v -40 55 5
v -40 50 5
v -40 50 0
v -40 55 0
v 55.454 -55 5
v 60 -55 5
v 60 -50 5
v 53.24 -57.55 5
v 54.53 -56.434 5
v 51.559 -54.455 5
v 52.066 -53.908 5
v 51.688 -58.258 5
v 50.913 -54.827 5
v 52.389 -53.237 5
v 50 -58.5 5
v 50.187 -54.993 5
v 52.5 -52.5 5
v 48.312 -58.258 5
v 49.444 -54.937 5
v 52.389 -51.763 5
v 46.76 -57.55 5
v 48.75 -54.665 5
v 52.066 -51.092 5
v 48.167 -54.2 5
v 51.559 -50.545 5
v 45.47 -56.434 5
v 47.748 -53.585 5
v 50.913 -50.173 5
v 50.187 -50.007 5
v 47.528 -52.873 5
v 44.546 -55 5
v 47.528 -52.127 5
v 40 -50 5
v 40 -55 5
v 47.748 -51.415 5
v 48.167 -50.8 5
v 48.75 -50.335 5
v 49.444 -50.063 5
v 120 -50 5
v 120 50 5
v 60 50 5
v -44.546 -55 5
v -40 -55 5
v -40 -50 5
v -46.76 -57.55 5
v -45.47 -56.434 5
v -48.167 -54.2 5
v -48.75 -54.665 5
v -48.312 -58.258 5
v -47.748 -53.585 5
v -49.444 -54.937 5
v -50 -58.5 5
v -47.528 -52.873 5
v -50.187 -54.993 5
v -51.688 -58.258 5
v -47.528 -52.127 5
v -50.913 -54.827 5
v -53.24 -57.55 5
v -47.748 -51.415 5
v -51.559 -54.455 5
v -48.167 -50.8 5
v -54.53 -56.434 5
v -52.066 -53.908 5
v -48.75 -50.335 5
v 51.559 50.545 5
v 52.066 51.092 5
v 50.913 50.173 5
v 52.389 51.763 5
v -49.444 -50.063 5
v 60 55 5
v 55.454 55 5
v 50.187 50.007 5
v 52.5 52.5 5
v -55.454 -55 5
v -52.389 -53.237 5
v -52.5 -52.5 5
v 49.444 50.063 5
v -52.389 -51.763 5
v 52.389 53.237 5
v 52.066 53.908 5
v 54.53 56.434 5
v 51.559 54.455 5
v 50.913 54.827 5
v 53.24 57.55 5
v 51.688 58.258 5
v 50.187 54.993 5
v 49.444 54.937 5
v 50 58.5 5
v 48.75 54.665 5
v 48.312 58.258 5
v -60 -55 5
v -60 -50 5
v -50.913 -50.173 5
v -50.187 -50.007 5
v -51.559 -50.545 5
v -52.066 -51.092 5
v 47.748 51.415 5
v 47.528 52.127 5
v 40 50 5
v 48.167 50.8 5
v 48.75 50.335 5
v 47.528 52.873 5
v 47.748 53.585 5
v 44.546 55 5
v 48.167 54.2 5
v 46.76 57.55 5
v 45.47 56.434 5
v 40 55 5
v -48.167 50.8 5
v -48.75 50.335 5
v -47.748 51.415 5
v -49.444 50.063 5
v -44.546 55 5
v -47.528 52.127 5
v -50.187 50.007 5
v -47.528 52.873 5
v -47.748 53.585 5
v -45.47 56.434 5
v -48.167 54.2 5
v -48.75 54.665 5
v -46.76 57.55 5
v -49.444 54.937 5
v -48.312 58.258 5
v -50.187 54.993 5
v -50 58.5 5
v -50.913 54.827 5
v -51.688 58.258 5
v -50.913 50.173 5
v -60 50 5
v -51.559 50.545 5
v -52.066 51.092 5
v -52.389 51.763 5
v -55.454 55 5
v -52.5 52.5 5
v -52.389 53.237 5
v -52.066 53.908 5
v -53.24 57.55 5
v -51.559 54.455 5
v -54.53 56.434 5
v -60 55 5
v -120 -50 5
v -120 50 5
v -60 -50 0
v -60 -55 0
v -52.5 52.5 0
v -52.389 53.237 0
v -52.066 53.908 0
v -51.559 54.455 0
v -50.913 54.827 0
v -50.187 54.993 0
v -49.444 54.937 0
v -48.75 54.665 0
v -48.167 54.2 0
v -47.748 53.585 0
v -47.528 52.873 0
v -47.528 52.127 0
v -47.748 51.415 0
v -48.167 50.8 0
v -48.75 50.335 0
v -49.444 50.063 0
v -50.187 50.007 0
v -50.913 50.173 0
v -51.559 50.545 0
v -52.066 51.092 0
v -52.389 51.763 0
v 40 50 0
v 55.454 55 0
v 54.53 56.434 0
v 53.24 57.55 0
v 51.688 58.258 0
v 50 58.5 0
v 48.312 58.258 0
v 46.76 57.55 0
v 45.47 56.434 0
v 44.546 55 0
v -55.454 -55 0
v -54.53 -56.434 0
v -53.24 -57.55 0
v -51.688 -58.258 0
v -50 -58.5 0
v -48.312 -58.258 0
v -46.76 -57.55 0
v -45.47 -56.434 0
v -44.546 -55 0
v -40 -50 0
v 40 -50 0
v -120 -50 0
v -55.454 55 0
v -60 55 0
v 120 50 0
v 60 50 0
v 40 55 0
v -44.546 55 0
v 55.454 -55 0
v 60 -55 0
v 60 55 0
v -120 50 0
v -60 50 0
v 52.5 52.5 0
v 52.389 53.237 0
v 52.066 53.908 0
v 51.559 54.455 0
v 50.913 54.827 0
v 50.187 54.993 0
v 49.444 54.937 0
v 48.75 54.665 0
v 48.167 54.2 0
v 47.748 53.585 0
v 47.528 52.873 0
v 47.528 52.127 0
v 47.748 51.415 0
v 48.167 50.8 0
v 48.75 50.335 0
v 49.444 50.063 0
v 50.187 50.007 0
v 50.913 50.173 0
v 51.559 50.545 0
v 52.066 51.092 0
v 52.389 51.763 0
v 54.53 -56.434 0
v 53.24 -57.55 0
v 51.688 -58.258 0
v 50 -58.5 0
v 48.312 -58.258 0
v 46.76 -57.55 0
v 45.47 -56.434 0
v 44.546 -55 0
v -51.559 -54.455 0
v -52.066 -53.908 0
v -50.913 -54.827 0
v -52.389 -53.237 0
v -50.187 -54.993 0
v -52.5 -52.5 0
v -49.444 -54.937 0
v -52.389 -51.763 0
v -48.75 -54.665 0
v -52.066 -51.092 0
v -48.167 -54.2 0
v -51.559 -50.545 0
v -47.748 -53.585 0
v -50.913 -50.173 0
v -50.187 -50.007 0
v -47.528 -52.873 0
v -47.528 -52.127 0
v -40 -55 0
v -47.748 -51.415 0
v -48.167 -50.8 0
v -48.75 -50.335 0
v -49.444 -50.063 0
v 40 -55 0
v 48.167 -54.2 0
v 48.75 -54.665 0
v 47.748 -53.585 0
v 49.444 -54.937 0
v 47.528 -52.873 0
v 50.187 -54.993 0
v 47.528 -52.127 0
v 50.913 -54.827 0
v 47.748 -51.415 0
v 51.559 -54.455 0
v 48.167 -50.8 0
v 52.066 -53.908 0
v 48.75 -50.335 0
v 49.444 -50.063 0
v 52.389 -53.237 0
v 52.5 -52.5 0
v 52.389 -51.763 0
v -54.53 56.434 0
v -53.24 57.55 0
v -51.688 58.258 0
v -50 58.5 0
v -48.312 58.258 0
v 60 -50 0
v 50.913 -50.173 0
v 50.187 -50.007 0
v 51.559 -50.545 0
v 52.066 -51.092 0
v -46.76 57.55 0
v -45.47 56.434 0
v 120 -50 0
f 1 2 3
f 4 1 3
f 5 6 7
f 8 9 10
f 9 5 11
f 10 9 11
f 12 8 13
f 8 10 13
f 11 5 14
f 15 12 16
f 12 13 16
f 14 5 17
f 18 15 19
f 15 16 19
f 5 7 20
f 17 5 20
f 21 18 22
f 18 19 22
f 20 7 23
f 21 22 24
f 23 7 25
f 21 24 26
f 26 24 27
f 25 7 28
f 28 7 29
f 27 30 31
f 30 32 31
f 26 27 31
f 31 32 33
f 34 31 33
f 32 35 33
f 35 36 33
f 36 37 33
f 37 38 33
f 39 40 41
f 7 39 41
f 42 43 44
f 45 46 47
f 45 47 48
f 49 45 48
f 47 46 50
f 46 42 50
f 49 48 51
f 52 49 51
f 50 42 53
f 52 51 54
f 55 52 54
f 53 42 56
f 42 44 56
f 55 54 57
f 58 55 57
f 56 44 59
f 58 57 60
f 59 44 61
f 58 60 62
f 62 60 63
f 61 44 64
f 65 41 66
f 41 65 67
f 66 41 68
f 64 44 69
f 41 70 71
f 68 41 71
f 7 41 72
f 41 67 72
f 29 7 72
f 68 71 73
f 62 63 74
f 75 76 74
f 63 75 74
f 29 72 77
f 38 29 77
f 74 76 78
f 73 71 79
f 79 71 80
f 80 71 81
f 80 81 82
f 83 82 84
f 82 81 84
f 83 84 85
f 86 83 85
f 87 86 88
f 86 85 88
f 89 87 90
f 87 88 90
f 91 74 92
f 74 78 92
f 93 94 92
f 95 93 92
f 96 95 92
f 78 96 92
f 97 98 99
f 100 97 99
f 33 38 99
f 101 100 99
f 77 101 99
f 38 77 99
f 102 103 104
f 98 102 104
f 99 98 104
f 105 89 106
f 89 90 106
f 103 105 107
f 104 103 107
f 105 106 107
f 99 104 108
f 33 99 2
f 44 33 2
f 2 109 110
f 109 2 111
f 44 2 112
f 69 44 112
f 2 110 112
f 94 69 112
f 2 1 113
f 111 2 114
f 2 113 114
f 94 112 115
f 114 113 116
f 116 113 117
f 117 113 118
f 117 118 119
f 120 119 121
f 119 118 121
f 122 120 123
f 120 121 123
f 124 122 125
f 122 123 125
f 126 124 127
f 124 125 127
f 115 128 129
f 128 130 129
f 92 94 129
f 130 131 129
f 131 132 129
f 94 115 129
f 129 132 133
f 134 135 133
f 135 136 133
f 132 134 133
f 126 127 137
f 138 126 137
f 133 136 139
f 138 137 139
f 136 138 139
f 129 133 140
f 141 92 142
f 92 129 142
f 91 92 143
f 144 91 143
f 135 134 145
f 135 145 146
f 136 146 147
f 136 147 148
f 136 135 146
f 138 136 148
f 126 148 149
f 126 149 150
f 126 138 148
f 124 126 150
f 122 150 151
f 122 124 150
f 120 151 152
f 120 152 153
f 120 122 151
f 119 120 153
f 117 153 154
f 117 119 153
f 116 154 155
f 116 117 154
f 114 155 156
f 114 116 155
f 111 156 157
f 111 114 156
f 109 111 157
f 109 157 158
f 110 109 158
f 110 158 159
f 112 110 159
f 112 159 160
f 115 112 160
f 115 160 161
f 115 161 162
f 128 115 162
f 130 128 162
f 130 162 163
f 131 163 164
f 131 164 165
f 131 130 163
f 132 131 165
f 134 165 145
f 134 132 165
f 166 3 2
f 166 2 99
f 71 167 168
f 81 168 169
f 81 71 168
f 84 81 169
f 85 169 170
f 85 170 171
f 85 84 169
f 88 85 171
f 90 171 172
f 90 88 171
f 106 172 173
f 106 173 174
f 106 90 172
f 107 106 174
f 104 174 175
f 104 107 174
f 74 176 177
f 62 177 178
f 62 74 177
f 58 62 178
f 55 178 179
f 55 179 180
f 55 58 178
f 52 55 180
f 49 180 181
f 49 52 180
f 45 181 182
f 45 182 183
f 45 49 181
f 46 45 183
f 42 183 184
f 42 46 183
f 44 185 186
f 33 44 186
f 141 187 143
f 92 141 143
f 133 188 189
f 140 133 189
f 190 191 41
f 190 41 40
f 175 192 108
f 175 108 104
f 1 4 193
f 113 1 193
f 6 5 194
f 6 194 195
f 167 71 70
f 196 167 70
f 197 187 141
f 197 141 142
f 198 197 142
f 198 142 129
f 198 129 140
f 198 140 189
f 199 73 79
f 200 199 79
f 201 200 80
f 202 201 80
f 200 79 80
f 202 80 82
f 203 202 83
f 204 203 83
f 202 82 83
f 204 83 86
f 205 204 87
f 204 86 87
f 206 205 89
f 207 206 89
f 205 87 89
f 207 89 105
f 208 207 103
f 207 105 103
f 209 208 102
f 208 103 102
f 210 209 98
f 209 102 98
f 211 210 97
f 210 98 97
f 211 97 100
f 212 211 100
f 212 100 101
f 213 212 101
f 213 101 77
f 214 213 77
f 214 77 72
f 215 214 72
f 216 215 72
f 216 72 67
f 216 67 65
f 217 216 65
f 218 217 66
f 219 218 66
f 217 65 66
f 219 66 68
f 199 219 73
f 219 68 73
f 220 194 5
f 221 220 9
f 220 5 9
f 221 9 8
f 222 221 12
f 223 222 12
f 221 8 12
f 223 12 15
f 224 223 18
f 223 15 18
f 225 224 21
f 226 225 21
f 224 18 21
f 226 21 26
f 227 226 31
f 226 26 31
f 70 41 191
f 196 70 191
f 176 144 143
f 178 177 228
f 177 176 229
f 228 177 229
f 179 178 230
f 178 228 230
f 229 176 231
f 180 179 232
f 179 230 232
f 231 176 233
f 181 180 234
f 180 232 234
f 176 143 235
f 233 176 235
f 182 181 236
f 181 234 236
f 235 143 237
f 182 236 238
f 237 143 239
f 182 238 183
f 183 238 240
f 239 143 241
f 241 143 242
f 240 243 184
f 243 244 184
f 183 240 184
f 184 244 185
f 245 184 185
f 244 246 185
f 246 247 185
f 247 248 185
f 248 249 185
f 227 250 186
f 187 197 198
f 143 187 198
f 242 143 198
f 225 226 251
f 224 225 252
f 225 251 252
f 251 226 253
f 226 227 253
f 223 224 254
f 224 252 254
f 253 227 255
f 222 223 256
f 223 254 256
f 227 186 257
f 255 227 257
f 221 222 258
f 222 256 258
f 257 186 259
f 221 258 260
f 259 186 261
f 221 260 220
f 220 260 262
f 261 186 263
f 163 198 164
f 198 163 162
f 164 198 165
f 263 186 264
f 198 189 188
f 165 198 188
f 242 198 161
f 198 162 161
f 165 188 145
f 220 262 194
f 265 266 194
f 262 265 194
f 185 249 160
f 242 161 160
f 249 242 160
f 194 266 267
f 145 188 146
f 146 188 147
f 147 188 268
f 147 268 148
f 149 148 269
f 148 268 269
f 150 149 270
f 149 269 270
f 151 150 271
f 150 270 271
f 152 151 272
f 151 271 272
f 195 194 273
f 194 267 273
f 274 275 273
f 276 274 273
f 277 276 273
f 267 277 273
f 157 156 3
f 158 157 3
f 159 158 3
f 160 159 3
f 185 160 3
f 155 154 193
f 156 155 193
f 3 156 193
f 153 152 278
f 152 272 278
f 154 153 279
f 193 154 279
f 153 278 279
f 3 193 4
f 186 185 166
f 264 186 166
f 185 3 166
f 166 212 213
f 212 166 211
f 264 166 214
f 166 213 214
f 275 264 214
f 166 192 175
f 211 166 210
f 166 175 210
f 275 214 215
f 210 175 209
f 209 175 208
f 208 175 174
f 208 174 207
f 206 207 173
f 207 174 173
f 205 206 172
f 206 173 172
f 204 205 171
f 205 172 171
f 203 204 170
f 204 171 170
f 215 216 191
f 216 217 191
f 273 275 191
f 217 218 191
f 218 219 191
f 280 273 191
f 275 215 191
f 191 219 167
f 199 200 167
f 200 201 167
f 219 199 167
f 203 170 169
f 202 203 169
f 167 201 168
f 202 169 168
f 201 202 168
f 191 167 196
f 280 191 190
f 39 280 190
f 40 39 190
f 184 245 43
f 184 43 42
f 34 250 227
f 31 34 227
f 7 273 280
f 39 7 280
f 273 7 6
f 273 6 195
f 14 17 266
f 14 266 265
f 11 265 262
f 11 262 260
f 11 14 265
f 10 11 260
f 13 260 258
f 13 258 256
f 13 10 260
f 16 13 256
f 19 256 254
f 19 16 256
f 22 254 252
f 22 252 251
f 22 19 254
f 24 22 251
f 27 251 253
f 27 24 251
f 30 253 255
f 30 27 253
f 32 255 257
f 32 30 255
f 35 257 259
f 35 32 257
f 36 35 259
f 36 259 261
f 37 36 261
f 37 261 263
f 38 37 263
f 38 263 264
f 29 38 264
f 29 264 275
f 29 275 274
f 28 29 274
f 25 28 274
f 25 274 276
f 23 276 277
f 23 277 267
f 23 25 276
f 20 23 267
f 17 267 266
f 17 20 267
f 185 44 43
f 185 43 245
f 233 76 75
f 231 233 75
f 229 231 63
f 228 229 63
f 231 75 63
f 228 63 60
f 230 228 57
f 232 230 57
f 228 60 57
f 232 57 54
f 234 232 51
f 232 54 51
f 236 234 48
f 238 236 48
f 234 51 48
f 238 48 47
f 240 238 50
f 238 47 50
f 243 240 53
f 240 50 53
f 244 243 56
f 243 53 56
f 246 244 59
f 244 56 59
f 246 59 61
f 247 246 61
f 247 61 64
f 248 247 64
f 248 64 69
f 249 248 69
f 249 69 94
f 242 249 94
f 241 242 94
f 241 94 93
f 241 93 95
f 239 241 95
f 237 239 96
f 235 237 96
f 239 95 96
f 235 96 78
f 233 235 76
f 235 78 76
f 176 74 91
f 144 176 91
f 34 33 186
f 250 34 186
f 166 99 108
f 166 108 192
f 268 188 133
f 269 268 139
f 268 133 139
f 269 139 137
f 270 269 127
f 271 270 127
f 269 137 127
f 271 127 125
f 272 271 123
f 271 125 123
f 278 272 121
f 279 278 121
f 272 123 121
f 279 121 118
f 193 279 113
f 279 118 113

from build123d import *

# Parameters (mm, degrees)
SKETCH1_W                                    = 240
SKETCH1_H                                    = 100
BOSS_EXTRUDE1_DEPTH                          = 5
SKETCH2_W                                    = 20
SKETCH2_H                                    = 5
BOSS_EXTRUDE2_DEPTH                          = 5
MIRROR1_AT_THE_SECOND_PLANE_COPY_1_SKETC_W   = 20
MIRROR1_AT_THE_SECOND_PLANE_COPY_1_SKETC_H   = 5
MIRROR1_AT_THE_SECOND_PLANE_COPY_1_DEPTH     = 5
SKETCH3_R                                    = 6
SKETCH3_R_2                                  = 2
BOSS_EXTRUDE3_DEPTH                          = 5
SKETCH4_R                                    = 2.5
CUT_EXTRUDE2_DEPTH                           = 5
MIRROR2_AT_THE_SECOND_PLANE_COPY_1_SKETC_R   = 6
MIRROR2_AT_THE_SECOND_PLANE_COPY_1_SKETC_R_2 = 2
MIRROR2_AT_THE_SECOND_PLANE_COPY_1_DEPTH     = 5
MIRROR2_AT_THE_SECOND_PLANE_COPY_2_SKETC_R   = 2.5
MIRROR2_AT_THE_SECOND_PLANE_COPY_2_DEPTH     = 5


with BuildPart() as part:
    # Sketch1 → Boss-Extrude1 (new body)
    with BuildSketch(Plane.XY):
        Rectangle(SKETCH1_W, SKETCH1_H)
    extrude(amount=BOSS_EXTRUDE1_DEPTH)

    # Sketch2 → Boss-Extrude2 (add)
    with BuildSketch(Plane(origin=(0, 50, 0), x_dir=(1, 0, 0), z_dir=(0, 1, 0))):
        with Locations((50, -2.5)):
            Rectangle(SKETCH2_W, SKETCH2_H)
    boss_extrude2 = extrude(amount=BOSS_EXTRUDE2_DEPTH)

    # Mirror1: Boss-Extrude2 across plane
    add(boss_extrude2.mirror(Plane(origin=(0, 0, 0), x_dir=(0, 0, 1), z_dir=(1, 0, 0))))

    # Mirror1 at the second plane: Boss-Extrude2 across plane
    add(boss_extrude2.mirror(Plane.ZX))

    # Mirror1 at the second plane copy 1 sketc → Mirror1 at the second plane copy 1 (add)
    with BuildSketch(Plane(origin=(0, -50, 0), x_dir=(-1, 0, 0), z_dir=(0, -1, 0))):
        with Locations((50, -2.5)):
            Rectangle(MIRROR1_AT_THE_SECOND_PLANE_COPY_1_SKETC_W, MIRROR1_AT_THE_SECOND_PLANE_COPY_1_SKETC_H)
    extrude(amount=MIRROR1_AT_THE_SECOND_PLANE_COPY_1_DEPTH)

    # Sketch3 → Boss-Extrude3 (add)
    with BuildSketch(Plane.XY.offset(5)):
        with Locations((50, 52.5)):
            Circle(SKETCH3_R)
        with Locations((50, 52.5)):
            Circle(SKETCH3_R_2, mode=Mode.SUBTRACT)
    boss_extrude3 = extrude(amount=-BOSS_EXTRUDE3_DEPTH)

    # Sketch4 → Cut-Extrude2 (cut)
    with BuildSketch(Plane.XY.offset(5)):
        with Locations((50, 52.5)):
            Circle(SKETCH4_R)
    cut_extrude2 = extrude(amount=-CUT_EXTRUDE2_DEPTH, mode=Mode.SUBTRACT)

    # Mirror2: Boss-Extrude3, Cut-Extrude2 across plane
    add(boss_extrude3.mirror(Plane.ZX))
    add(cut_extrude2.mirror(Plane.ZX), mode=Mode.SUBTRACT)

    # Mirror2 at the second plane: Boss-Extrude3, Cut-Extrude2 across plane
    add(boss_extrude3.mirror(Plane(origin=(0, 0, 0), x_dir=(0, 0, 1), z_dir=(1, 0, 0))))
    add(cut_extrude2.mirror(Plane(origin=(0, 0, 0), x_dir=(0, 0, 1), z_dir=(1, 0, 0))), mode=Mode.SUBTRACT)

    # Mirror2 at the second plane copy 1 sketc → Mirror2 at the second plane copy 1 (add)
    with BuildSketch(Plane(origin=(0, 0, 5), x_dir=(-1, 0, 0), z_dir=(0, 0, 1))):
        with Locations((50, 52.5)):
            Circle(MIRROR2_AT_THE_SECOND_PLANE_COPY_1_SKETC_R)
        with Locations((50, 52.5)):
            Circle(MIRROR2_AT_THE_SECOND_PLANE_COPY_1_SKETC_R_2, mode=Mode.SUBTRACT)
    extrude(amount=-MIRROR2_AT_THE_SECOND_PLANE_COPY_1_DEPTH)

    # Mirror2 at the second plane copy 2 sketc → Mirror2 at the second plane copy 2 (cut)
    with BuildSketch(Plane(origin=(0, 0, 5), x_dir=(-1, 0, 0), z_dir=(0, 0, 1))):
        with Locations((50, 52.5)):
            Circle(MIRROR2_AT_THE_SECOND_PLANE_COPY_2_SKETC_R)
    extrude(amount=-MIRROR2_AT_THE_SECOND_PLANE_COPY_2_DEPTH, mode=Mode.SUBTRACT)


solid = part.part
